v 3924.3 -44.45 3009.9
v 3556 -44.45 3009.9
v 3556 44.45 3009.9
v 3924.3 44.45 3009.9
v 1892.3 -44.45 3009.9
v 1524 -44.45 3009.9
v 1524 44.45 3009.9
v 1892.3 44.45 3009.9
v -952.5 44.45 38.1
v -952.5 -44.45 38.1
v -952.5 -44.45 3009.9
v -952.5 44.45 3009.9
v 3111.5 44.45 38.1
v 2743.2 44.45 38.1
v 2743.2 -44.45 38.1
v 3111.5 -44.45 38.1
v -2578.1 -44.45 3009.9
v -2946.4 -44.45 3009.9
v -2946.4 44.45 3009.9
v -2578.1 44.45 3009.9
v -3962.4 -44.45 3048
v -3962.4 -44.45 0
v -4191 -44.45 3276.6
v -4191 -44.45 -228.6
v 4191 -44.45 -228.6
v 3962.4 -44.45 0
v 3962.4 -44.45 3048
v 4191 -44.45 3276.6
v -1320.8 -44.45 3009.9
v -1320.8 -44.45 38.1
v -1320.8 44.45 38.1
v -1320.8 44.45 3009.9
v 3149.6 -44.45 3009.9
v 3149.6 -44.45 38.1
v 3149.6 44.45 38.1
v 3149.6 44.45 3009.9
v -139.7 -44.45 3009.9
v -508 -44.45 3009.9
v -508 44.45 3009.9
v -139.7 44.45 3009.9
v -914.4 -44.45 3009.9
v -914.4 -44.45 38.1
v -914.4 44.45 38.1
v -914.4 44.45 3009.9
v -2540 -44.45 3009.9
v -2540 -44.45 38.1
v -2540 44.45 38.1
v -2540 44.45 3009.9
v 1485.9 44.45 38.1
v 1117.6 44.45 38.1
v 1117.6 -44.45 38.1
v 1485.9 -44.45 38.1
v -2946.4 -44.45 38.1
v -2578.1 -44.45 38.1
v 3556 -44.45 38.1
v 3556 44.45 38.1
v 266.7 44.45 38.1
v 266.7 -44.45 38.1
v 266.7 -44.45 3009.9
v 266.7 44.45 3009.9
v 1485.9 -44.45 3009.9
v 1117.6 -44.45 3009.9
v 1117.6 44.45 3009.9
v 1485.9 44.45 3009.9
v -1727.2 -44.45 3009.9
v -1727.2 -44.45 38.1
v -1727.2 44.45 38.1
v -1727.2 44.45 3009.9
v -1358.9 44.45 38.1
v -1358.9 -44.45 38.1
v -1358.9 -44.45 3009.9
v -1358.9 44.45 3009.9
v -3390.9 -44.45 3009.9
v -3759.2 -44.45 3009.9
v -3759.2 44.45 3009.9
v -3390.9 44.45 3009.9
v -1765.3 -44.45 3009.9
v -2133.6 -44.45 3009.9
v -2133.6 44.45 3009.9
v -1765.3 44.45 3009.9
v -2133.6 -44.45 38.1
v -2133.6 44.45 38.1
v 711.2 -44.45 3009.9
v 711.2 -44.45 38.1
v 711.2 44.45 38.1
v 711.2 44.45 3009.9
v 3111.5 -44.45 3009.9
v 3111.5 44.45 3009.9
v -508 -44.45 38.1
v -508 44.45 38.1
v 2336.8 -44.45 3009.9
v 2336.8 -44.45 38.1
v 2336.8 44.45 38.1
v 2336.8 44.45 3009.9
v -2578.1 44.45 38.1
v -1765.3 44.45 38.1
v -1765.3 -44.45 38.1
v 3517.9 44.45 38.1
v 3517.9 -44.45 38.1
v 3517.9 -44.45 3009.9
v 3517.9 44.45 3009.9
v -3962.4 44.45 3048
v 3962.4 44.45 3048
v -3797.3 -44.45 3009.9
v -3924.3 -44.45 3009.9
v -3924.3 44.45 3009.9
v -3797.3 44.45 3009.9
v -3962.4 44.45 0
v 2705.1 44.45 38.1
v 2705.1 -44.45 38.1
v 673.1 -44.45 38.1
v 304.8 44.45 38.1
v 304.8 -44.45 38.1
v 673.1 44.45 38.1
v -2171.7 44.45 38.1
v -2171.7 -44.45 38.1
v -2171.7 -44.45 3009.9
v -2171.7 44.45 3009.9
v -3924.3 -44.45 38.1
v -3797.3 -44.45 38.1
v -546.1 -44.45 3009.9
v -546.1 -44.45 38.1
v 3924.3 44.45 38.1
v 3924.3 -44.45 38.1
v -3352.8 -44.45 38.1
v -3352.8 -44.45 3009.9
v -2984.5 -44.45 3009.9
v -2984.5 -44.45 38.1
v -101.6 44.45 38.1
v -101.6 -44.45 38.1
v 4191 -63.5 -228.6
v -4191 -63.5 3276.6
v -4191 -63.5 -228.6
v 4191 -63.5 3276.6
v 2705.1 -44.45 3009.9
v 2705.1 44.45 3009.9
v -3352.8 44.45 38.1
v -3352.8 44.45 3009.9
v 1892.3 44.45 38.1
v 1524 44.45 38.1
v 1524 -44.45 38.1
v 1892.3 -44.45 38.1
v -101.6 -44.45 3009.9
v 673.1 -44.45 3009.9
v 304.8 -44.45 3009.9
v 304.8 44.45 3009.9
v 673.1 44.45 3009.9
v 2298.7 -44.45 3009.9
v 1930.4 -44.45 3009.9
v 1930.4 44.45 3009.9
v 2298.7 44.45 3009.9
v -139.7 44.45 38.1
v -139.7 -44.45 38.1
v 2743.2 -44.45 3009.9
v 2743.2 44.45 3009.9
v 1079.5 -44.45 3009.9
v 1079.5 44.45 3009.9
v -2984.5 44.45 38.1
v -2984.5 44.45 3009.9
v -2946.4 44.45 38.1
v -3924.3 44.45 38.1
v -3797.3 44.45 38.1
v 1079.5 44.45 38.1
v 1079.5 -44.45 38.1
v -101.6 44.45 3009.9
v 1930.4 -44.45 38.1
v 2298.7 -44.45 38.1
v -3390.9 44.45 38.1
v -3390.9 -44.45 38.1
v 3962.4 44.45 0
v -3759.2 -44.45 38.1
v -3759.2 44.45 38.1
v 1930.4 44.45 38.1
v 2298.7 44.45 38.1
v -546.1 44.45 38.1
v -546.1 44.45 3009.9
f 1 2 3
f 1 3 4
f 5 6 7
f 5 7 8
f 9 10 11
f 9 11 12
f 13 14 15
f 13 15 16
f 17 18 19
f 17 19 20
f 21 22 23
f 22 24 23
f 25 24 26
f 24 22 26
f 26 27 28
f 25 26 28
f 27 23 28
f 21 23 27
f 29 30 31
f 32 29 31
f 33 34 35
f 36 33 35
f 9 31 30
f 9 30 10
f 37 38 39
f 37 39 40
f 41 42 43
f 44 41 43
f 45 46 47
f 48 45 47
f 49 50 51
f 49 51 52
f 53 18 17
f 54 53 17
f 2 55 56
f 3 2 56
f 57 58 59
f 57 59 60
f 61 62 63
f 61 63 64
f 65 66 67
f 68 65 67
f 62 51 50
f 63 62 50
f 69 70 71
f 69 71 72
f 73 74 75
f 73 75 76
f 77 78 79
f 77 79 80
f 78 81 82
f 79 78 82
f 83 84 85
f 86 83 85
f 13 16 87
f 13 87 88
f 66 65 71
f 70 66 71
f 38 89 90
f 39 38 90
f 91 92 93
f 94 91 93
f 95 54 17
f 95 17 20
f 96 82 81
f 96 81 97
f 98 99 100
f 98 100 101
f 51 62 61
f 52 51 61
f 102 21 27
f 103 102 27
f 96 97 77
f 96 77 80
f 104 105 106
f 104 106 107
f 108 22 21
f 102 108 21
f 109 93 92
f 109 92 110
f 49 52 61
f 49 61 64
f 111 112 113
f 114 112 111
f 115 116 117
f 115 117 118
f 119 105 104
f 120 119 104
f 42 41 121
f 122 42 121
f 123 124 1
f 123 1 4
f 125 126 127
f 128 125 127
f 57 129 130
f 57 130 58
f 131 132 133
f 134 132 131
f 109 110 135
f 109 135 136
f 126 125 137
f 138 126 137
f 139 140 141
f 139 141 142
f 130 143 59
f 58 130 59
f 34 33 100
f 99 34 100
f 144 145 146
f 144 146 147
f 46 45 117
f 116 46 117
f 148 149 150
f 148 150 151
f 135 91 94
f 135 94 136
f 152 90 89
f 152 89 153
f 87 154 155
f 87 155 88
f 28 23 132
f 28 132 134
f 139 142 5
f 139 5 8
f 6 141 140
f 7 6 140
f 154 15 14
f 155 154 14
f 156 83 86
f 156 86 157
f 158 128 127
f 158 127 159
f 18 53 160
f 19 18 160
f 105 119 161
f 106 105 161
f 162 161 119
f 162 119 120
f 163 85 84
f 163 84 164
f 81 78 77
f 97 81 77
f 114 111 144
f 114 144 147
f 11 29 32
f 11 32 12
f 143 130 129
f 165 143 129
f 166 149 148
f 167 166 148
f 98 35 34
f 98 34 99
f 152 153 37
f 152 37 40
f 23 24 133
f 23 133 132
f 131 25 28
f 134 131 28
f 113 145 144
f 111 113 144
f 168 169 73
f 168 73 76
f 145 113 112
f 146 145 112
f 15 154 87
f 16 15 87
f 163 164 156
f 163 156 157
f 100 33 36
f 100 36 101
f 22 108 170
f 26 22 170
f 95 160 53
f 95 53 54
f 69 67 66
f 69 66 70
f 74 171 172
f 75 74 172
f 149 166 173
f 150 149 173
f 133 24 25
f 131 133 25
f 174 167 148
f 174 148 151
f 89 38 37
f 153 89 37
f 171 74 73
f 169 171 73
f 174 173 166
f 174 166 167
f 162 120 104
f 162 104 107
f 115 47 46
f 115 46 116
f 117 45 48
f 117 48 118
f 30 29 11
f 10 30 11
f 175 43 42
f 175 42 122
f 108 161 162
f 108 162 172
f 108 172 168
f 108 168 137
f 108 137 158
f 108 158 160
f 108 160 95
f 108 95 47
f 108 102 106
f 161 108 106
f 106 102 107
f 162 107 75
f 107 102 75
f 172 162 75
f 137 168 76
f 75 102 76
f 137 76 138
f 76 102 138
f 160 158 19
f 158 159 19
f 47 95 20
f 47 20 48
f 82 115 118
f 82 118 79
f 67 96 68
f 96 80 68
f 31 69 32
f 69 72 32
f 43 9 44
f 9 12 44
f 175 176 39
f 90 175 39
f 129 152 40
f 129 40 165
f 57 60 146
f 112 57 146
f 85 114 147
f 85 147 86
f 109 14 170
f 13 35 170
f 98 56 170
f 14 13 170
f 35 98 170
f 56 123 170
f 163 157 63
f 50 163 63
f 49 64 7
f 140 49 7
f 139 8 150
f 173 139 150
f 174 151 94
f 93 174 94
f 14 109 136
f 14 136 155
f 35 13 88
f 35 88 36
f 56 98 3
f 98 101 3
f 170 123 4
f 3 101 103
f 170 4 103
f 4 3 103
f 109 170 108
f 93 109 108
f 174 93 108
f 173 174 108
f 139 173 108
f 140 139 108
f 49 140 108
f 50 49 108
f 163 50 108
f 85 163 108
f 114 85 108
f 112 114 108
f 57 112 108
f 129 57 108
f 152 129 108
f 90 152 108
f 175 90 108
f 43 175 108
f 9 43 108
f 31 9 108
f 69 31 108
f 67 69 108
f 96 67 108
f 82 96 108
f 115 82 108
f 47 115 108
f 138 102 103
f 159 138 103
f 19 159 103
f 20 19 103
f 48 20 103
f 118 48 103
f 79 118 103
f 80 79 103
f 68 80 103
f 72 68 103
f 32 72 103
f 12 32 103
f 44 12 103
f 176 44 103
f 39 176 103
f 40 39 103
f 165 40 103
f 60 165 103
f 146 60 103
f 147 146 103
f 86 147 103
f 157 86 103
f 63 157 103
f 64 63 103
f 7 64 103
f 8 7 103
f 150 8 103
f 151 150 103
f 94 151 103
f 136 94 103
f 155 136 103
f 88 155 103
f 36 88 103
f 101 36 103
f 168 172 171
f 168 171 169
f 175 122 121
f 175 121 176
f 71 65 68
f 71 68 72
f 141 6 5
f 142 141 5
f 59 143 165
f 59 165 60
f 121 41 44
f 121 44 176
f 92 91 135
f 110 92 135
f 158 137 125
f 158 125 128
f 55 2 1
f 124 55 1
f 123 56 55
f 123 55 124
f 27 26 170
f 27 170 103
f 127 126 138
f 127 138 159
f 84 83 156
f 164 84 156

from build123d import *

# Parameters (mm, degrees)
F0_W     = 7924.8
F0_H     = 88.9
F1_DEPTH = 38.1
F2_W     = 38.1
F2_H     = 88.9
F3_DEPTH = 2971.8
F4_W     = 7924.8
F4_H     = 38.1
F5_DEPTH = 88.9
F6_W     = 8382
F6_H     = 3505.2
F7_DEPTH = 19.05


with BuildPart() as f1:
    # F0 (on Top) → F1 (new body)
    with BuildSketch(Plane.XY):
        Rectangle(F0_W, F0_H)
    extrude(amount=F1_DEPTH)

    # F2 (on face) → F3 (join)
    with BuildSketch(Plane.XY.offset(38.1)):
        with Locations((3943.35, 0)):
            Rectangle(F2_W, F2_H)
        with Locations((3536.95, 0)):
            Rectangle(F2_W, F2_H)
        with Locations((3130.55, 0)):
            Rectangle(F2_W, F2_H)
        with Locations((2724.15, 0)):
            Rectangle(F2_W, F2_H)
        with Locations((2317.75, 0)):
            Rectangle(F2_W, F2_H)
        with Locations((1911.35, 0)):
            Rectangle(F2_W, F2_H)
        with Locations((1504.95, 0)):
            Rectangle(F2_W, F2_H)
        with Locations((1098.55, 0)):
            Rectangle(F2_W, F2_H)
        with Locations((692.15, 0)):
            Rectangle(F2_W, F2_H)
        with Locations((285.75, 0)):
            Rectangle(F2_W, F2_H)
        with Locations((-120.65, 0)):
            Rectangle(F2_W, F2_H)
        with Locations((-527.05, 0)):
            Rectangle(F2_W, F2_H)
        with Locations((-933.45, 0)):
            Rectangle(F2_W, F2_H)
        with Locations((-1339.85, 0)):
            Rectangle(F2_W, F2_H)
        with Locations((-1746.25, 0)):
            Rectangle(F2_W, F2_H)
        with Locations((-2152.65, 0)):
            Rectangle(F2_W, F2_H)
        with Locations((-2559.05, 0)):
            Rectangle(F2_W, F2_H)
        with Locations((-2965.45, 0)):
            Rectangle(F2_W, F2_H)
        with Locations((-3943.35, 0)):
            Rectangle(F2_W, F2_H)
        with Locations((-3371.85, 0)):
            Rectangle(F2_W, F2_H)
        with Locations((-3778.25, 0)):
            Rectangle(F2_W, F2_H)
    extrude(amount=F3_DEPTH)

    # F4 (on face) → F5 (join)
    with BuildSketch(Plane.XZ.offset(44.45)):
        with Locations((0, 3028.95)):
            Rectangle(F4_W, F4_H)
    extrude(amount=-F5_DEPTH)

    # F6 (on face) → F7 (join)
    with BuildSketch(Plane.XZ.offset(44.45)):
        with Locations((0, 1524)):
            Rectangle(F6_W, F6_H)
    extrude(amount=F7_DEPTH)


solid = f1.part
